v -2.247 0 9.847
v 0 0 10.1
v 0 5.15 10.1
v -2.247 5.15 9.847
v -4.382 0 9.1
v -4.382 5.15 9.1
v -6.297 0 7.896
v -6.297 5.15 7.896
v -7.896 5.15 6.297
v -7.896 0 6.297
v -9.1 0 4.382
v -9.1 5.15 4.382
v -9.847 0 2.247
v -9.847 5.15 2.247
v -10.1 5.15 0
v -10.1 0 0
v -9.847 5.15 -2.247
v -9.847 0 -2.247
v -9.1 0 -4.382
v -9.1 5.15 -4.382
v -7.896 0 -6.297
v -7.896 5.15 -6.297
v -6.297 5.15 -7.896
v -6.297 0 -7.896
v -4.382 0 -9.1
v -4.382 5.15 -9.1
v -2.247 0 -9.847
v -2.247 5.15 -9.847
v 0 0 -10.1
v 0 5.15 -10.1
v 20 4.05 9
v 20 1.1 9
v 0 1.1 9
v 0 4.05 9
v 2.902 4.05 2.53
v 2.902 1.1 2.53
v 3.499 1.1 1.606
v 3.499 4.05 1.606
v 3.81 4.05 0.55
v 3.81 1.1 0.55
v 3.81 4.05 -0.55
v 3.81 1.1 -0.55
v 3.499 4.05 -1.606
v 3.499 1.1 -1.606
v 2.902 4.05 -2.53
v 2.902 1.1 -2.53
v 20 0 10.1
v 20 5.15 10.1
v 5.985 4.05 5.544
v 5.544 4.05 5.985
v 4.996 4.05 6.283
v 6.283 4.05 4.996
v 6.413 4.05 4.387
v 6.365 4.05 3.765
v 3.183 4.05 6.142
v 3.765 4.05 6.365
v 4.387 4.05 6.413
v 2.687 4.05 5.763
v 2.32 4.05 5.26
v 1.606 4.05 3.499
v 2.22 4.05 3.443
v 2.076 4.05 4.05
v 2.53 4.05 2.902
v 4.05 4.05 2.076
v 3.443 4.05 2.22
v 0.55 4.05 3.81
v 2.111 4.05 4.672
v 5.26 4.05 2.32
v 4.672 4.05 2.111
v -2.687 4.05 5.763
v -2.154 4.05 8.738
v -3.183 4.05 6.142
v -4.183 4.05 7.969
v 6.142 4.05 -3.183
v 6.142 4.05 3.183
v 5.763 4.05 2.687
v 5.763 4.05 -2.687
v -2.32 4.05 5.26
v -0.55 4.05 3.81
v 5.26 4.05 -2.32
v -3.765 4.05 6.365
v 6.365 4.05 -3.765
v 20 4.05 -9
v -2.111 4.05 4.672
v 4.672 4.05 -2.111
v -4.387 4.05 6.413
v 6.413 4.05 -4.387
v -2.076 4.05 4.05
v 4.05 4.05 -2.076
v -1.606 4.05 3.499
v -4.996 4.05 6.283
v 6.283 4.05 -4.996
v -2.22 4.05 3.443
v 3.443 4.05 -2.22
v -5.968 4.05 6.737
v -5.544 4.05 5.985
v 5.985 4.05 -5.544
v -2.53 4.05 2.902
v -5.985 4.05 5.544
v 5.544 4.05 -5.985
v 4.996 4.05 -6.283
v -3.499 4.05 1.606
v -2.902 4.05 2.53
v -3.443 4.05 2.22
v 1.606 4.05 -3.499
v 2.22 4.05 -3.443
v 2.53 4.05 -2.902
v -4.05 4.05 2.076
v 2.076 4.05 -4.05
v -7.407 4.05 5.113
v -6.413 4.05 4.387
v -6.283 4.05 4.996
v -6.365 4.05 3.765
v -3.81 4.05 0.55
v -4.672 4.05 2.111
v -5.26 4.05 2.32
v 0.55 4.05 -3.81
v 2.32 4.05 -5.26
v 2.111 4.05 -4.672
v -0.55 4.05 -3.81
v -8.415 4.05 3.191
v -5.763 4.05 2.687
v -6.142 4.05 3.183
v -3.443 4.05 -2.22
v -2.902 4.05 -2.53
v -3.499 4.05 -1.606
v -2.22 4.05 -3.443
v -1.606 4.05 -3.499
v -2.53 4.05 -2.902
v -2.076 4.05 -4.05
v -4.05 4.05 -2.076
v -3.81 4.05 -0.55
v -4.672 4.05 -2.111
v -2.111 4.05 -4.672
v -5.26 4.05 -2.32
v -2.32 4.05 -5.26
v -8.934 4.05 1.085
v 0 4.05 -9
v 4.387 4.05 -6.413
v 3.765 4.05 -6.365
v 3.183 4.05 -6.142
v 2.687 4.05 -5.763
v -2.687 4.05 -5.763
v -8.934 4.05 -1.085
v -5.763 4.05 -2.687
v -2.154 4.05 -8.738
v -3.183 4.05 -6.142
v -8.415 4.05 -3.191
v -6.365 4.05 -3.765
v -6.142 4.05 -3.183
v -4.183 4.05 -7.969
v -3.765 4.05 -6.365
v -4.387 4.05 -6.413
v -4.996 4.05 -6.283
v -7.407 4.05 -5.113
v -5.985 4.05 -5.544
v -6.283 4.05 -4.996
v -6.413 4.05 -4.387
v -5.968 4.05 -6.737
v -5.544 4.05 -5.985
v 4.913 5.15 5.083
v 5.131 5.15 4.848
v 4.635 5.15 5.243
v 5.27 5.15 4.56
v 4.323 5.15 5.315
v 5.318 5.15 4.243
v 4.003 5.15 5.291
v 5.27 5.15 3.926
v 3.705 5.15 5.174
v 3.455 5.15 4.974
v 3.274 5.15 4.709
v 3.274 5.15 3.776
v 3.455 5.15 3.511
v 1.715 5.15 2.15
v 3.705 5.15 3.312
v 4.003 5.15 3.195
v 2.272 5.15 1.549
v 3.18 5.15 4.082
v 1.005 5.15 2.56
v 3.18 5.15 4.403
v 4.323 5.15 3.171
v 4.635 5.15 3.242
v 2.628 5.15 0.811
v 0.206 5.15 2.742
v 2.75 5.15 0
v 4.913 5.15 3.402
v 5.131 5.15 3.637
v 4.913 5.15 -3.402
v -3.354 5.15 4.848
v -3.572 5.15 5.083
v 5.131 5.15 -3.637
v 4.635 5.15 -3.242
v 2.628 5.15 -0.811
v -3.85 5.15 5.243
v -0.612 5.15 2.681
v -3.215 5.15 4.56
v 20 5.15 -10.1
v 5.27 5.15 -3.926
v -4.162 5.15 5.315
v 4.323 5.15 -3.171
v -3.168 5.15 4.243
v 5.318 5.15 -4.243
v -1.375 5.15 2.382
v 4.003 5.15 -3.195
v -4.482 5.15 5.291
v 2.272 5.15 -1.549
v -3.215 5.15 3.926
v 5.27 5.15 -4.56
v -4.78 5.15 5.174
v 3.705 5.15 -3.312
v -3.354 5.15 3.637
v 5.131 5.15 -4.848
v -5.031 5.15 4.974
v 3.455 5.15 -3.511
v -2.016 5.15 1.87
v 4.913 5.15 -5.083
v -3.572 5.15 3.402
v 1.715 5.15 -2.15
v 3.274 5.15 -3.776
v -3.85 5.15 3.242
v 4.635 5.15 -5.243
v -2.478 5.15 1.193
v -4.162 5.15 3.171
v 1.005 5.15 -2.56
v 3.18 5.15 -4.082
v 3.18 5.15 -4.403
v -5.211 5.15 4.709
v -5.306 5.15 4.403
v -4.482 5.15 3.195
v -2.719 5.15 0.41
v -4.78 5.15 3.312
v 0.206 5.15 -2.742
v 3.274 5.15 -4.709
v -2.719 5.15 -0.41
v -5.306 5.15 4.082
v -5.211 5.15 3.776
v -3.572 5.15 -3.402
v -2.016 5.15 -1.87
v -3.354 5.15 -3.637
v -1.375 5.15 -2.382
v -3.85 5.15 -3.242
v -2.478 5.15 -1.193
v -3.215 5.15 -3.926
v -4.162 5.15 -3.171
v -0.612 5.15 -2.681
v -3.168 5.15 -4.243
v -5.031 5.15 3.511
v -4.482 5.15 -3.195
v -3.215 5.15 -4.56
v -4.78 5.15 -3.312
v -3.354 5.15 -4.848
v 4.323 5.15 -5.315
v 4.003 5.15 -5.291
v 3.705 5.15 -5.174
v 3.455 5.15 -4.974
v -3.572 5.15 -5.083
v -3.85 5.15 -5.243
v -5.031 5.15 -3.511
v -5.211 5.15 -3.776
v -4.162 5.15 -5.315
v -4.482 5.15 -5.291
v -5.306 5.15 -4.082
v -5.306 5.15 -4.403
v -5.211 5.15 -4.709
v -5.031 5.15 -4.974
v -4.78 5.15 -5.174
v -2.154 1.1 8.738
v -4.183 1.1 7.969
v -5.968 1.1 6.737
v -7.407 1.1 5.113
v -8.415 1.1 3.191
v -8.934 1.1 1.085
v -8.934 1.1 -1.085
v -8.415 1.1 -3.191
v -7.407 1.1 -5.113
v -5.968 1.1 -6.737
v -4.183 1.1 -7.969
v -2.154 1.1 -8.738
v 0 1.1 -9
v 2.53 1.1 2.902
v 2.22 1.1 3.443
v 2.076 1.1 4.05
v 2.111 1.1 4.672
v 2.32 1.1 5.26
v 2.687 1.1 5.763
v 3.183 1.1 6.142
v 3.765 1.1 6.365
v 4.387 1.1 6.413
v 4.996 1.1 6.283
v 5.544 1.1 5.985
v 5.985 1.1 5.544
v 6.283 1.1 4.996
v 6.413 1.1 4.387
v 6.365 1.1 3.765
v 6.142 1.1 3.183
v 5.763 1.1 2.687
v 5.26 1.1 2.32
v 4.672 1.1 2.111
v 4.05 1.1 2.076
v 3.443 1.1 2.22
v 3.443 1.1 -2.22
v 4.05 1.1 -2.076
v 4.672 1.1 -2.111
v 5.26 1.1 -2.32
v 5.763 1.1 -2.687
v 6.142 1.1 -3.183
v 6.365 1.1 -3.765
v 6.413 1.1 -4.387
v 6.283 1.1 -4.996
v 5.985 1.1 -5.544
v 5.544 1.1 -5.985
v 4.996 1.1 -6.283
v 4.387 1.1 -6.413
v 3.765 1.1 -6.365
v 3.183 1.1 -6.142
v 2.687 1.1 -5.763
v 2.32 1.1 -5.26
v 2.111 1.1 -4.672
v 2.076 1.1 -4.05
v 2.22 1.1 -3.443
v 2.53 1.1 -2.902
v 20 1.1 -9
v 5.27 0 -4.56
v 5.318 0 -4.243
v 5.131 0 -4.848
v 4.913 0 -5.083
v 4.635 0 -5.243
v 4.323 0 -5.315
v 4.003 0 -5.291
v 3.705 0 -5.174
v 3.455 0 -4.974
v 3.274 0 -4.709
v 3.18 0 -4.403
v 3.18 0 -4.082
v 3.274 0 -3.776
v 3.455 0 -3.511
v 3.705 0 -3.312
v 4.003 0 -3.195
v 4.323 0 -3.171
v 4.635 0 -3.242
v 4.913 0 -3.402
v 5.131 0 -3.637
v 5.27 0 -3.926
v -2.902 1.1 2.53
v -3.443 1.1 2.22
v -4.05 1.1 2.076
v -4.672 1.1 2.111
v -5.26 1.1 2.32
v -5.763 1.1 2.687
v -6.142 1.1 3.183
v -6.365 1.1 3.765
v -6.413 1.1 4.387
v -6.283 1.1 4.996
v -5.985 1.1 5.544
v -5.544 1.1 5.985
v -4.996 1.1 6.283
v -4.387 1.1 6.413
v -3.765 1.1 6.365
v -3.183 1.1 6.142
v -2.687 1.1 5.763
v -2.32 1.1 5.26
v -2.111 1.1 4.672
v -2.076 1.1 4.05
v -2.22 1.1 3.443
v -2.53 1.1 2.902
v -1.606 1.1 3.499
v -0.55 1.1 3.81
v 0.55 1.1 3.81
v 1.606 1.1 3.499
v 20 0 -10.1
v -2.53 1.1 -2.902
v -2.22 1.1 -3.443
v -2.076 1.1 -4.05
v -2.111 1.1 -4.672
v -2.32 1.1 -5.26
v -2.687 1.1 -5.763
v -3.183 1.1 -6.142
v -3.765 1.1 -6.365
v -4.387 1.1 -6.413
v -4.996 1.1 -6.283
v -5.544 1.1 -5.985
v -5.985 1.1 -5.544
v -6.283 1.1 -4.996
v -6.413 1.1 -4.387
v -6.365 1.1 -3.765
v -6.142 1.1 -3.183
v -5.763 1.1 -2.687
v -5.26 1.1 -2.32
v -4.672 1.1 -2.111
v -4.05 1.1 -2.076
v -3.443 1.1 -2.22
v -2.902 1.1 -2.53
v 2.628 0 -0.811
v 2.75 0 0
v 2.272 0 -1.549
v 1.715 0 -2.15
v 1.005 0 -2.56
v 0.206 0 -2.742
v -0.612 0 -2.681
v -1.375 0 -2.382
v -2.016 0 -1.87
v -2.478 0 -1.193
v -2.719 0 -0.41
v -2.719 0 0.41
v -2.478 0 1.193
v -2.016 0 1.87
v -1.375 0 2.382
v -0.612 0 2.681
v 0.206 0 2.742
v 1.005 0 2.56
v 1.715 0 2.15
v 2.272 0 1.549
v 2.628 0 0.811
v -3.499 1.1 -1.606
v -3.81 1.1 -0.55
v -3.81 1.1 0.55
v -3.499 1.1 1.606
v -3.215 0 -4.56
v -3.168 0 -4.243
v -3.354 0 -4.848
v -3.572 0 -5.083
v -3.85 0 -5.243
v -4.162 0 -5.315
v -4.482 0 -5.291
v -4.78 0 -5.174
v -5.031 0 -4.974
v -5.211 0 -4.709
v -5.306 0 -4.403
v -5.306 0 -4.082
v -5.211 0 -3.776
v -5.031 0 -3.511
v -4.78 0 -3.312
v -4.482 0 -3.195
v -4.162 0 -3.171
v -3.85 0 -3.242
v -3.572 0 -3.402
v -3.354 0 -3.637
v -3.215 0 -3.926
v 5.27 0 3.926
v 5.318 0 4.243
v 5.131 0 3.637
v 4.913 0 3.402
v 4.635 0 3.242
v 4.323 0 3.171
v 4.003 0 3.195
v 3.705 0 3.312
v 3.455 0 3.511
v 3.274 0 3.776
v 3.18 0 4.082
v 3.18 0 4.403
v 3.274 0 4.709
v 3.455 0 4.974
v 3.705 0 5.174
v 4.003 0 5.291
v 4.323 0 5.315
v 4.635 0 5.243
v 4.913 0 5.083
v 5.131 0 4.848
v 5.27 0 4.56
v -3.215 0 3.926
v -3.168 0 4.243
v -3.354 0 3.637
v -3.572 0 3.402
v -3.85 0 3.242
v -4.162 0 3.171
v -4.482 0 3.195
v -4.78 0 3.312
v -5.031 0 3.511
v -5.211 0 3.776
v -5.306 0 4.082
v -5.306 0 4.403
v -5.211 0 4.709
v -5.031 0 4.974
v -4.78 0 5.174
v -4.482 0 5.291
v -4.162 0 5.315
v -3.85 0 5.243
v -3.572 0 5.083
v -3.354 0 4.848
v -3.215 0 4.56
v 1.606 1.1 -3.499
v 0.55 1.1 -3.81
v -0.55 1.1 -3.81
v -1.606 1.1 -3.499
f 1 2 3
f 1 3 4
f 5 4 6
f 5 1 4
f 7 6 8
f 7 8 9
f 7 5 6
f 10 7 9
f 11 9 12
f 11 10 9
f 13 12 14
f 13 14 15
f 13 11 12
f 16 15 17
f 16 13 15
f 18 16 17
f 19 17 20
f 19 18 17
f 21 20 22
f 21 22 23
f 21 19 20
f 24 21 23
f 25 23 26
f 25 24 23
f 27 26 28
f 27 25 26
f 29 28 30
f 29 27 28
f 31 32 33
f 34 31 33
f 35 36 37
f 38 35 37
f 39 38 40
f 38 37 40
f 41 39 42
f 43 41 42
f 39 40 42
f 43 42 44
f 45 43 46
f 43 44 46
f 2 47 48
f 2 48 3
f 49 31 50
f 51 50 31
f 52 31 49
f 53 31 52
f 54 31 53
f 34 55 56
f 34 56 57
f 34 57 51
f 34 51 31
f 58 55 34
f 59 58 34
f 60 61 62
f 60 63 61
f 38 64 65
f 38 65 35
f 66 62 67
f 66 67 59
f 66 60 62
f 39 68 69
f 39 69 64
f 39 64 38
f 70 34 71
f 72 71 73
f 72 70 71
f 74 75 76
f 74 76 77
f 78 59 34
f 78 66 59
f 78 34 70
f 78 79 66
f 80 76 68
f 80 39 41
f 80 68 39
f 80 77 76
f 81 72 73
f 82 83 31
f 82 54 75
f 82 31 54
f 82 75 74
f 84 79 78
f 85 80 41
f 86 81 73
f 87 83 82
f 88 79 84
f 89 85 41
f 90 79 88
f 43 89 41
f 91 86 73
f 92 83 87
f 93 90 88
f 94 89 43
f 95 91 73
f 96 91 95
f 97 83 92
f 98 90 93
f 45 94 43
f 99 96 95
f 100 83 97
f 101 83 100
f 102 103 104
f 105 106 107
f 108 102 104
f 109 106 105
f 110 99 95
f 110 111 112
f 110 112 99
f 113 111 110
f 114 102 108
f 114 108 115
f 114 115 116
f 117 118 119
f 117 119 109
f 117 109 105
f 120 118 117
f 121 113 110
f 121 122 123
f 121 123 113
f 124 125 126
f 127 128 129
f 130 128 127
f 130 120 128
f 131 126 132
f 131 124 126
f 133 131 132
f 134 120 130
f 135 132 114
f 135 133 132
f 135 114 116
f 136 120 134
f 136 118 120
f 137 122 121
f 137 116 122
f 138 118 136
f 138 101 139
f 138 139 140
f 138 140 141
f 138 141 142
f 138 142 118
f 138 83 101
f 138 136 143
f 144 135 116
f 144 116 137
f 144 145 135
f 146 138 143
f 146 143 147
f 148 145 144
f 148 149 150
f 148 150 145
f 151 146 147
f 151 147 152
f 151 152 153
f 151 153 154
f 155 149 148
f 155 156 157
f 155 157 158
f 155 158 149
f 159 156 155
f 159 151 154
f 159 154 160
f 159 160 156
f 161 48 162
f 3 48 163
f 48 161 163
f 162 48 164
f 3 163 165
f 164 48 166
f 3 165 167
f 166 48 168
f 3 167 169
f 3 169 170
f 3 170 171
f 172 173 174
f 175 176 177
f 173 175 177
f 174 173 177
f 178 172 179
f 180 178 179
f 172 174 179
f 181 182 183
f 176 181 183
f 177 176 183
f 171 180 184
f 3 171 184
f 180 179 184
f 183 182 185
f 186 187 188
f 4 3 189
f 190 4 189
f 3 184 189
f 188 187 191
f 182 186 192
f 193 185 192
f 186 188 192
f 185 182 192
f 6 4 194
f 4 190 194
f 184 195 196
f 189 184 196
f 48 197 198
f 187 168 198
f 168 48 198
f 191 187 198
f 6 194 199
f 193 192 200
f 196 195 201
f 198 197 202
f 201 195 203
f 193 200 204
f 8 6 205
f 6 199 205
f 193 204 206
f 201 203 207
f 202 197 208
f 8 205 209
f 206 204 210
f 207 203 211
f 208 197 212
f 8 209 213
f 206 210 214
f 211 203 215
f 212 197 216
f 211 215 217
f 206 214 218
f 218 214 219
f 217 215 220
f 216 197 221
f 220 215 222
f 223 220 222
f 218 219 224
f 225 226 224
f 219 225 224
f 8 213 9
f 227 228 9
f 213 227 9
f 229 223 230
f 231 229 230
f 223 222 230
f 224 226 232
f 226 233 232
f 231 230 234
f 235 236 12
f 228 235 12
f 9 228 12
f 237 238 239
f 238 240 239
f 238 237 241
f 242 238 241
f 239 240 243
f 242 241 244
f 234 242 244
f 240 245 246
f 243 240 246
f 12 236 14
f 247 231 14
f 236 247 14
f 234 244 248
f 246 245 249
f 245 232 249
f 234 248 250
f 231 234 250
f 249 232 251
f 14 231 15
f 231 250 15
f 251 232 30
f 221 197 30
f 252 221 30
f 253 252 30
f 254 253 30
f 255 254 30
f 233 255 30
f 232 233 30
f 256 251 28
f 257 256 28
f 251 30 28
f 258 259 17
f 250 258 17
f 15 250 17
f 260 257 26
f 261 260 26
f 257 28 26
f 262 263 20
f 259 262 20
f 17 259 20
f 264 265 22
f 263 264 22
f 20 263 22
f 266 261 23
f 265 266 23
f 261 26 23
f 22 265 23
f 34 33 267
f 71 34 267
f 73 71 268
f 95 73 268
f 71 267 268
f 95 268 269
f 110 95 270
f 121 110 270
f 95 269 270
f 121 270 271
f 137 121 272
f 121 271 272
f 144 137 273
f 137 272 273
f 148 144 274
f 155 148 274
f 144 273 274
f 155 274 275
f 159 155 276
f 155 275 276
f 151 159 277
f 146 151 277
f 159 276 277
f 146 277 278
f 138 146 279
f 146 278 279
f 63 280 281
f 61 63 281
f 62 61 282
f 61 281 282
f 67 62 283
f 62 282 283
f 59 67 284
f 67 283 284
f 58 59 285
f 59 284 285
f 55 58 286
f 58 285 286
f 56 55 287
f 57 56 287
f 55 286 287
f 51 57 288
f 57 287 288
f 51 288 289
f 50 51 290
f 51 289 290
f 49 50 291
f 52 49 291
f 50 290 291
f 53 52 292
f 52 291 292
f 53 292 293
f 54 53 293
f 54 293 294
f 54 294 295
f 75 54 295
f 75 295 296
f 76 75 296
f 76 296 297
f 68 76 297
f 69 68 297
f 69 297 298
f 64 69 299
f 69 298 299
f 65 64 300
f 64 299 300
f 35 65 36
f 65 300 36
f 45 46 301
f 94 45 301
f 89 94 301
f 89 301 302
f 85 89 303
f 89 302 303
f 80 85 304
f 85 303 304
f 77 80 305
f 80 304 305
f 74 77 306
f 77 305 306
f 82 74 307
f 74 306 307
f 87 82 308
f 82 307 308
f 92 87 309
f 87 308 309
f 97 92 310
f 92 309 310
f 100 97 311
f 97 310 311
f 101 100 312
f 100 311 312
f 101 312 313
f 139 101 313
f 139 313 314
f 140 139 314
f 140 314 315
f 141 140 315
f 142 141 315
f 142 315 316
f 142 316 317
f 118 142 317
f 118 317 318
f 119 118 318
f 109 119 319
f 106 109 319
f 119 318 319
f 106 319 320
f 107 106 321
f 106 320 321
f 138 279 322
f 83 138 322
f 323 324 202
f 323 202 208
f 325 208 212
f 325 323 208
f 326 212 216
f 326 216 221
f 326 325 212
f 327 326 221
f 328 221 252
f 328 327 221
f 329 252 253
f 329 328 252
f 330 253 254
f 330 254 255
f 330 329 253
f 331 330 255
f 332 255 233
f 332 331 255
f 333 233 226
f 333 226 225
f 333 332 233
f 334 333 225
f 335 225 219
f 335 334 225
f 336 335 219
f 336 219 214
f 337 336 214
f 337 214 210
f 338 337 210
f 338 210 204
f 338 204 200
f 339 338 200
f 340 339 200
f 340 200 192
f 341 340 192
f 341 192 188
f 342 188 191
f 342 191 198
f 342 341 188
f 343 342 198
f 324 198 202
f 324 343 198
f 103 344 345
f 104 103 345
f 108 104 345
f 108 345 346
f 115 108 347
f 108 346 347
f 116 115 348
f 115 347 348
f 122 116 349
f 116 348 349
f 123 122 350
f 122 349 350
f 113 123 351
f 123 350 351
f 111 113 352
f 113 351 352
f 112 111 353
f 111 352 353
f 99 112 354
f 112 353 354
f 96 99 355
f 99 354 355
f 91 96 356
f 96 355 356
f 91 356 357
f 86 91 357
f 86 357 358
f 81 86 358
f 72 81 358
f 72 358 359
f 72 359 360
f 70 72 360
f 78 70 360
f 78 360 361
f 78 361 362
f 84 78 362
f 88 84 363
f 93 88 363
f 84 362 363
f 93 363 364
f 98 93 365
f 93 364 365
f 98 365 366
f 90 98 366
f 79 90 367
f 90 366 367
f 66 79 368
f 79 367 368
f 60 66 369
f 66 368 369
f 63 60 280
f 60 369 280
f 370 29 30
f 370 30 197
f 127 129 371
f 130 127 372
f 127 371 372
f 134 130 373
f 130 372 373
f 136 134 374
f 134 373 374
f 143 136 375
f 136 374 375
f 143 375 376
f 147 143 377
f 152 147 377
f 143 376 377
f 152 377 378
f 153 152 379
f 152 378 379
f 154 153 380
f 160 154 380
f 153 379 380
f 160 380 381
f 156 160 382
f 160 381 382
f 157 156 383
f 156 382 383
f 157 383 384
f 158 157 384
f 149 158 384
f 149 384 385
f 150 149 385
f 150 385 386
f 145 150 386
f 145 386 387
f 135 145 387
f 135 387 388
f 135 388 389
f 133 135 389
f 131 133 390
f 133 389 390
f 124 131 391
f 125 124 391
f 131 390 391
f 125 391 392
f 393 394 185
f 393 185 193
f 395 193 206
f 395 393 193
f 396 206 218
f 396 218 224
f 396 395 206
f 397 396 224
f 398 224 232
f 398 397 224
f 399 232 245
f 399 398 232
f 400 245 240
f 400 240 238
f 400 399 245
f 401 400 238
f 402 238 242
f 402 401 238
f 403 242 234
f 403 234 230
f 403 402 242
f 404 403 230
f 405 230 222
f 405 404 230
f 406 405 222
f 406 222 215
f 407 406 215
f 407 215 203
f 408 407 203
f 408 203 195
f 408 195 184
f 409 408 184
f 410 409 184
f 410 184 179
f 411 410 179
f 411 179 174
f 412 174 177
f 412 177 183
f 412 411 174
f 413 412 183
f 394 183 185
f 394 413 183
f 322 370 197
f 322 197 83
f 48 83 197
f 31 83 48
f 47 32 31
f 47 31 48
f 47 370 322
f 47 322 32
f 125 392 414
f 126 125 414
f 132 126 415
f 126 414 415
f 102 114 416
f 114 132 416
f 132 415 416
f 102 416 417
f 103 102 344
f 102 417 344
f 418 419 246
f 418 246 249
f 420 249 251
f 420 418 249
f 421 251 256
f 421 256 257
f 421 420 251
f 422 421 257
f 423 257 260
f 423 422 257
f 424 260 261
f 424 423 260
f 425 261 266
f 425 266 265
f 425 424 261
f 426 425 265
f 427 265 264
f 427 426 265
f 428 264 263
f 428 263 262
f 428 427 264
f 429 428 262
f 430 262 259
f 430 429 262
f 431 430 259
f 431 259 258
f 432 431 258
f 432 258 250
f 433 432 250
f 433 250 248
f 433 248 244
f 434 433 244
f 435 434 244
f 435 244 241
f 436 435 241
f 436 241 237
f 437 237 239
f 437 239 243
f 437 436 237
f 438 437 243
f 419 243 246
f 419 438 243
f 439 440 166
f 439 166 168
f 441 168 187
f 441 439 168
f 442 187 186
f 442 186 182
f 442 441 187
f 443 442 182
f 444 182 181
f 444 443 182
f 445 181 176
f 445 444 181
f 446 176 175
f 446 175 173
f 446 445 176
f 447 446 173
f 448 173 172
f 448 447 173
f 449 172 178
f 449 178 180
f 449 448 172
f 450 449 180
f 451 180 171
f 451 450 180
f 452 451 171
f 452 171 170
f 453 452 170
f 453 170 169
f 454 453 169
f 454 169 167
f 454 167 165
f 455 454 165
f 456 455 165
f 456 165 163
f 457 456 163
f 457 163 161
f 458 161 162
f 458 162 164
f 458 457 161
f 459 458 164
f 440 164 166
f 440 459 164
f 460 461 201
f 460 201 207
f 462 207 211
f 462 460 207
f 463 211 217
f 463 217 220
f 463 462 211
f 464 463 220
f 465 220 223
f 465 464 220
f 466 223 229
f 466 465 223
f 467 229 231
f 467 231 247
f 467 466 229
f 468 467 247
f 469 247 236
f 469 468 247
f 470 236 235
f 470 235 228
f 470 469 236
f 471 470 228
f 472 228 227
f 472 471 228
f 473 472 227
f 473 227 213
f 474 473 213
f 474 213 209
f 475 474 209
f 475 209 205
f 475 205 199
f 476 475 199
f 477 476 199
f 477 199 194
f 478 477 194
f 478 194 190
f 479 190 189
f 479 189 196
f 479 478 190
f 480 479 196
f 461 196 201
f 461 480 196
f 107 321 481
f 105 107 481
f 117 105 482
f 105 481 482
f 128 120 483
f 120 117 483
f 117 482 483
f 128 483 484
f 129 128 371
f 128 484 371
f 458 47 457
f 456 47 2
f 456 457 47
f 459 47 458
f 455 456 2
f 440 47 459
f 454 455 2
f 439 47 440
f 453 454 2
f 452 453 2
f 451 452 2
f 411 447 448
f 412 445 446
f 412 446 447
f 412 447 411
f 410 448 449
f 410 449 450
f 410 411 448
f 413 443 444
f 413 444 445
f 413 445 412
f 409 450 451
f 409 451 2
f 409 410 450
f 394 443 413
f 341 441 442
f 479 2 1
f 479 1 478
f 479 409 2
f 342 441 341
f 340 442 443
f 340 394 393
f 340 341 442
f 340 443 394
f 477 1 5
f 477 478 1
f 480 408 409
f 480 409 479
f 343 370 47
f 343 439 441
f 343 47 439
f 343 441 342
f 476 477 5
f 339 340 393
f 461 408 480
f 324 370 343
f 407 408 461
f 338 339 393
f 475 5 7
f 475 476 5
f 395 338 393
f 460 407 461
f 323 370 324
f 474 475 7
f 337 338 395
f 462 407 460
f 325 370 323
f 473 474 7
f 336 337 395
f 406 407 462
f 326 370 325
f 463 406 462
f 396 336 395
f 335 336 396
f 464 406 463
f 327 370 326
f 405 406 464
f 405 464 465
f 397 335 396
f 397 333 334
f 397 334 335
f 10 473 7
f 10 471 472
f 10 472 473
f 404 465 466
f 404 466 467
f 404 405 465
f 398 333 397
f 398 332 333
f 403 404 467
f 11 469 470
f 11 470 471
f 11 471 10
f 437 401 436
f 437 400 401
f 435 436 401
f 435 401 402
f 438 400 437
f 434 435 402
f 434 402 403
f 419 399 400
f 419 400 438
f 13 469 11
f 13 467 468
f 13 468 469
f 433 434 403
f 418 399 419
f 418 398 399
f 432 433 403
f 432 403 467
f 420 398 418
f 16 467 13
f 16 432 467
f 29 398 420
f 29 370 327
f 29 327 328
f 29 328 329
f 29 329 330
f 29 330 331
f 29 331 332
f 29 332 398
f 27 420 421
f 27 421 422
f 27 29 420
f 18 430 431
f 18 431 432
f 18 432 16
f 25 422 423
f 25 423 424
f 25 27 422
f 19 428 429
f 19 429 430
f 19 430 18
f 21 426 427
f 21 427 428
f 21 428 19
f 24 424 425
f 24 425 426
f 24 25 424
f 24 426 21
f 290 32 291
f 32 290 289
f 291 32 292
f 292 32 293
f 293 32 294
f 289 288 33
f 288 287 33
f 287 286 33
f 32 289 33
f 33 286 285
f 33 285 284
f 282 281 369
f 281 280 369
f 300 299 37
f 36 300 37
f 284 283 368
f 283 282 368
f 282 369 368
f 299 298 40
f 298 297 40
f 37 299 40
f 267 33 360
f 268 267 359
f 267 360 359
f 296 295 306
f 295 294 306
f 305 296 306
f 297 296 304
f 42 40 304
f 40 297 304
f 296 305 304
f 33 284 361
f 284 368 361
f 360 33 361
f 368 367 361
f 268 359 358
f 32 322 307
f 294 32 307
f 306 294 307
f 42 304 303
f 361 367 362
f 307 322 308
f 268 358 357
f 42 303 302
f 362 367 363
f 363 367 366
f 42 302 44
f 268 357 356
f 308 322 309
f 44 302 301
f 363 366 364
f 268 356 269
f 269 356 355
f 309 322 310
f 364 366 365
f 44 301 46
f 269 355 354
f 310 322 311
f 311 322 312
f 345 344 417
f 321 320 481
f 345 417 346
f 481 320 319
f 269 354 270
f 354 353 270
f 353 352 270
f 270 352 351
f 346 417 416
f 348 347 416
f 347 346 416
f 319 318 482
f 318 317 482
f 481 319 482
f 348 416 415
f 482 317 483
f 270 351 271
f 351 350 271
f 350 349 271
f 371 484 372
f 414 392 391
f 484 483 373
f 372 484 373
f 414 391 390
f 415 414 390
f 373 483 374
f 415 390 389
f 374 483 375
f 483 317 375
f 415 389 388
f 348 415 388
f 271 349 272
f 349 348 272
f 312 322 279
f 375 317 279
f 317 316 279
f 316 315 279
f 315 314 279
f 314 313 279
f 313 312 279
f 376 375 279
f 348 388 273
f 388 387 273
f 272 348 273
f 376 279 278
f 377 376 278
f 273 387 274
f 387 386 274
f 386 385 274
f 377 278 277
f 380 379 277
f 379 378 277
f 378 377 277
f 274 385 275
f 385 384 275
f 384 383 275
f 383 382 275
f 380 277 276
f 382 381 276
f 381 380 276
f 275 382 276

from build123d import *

# Parameters (mm, degrees)
SKETCH2_R           = 1.075
SKETCH2_R_2         = 2.75
BOSS_EXTRUDE1_DEPTH = 5.15
SHELL1_T            = -1.1


with BuildPart() as part:
    # Sketch2 → Boss-Extrude1 (new body)
    with BuildSketch(Plane(origin=(0, 0, 0), x_dir=(1, 0, 0), z_dir=(0, 1, 0))):
        with BuildLine():
            Line((0, 10.1), (20, 10.1))
            Line((20, 10.1), (20, -10.1))
            Line((20, -10.1), (0, -10.1))
            ThreePointArc((0, -10.1), (-10.1, 0), (0, 10.1))
        make_face()
        with Locations((-4.242640687, 4.242640687)):
            Circle(SKETCH2_R, mode=Mode.SUBTRACT)
        with Locations((4.242640687, 4.242640687)):
            Circle(SKETCH2_R, mode=Mode.SUBTRACT)
        with Locations((-4.242640687, -4.242640687)):
            Circle(SKETCH2_R, mode=Mode.SUBTRACT)
        with Locations((4.242640687, -4.242640687)):
            Circle(SKETCH2_R, mode=Mode.SUBTRACT)
        Circle(SKETCH2_R_2, mode=Mode.SUBTRACT)
    extrude(amount=BOSS_EXTRUDE1_DEPTH)

    # Shell1
    shell1_openings = [part.faces().sort_by_distance(p)[0] for p in [
        (20, 2.575, 0),
    ]]
    offset(amount=SHELL1_T, openings=shell1_openings)


solid = part.part
